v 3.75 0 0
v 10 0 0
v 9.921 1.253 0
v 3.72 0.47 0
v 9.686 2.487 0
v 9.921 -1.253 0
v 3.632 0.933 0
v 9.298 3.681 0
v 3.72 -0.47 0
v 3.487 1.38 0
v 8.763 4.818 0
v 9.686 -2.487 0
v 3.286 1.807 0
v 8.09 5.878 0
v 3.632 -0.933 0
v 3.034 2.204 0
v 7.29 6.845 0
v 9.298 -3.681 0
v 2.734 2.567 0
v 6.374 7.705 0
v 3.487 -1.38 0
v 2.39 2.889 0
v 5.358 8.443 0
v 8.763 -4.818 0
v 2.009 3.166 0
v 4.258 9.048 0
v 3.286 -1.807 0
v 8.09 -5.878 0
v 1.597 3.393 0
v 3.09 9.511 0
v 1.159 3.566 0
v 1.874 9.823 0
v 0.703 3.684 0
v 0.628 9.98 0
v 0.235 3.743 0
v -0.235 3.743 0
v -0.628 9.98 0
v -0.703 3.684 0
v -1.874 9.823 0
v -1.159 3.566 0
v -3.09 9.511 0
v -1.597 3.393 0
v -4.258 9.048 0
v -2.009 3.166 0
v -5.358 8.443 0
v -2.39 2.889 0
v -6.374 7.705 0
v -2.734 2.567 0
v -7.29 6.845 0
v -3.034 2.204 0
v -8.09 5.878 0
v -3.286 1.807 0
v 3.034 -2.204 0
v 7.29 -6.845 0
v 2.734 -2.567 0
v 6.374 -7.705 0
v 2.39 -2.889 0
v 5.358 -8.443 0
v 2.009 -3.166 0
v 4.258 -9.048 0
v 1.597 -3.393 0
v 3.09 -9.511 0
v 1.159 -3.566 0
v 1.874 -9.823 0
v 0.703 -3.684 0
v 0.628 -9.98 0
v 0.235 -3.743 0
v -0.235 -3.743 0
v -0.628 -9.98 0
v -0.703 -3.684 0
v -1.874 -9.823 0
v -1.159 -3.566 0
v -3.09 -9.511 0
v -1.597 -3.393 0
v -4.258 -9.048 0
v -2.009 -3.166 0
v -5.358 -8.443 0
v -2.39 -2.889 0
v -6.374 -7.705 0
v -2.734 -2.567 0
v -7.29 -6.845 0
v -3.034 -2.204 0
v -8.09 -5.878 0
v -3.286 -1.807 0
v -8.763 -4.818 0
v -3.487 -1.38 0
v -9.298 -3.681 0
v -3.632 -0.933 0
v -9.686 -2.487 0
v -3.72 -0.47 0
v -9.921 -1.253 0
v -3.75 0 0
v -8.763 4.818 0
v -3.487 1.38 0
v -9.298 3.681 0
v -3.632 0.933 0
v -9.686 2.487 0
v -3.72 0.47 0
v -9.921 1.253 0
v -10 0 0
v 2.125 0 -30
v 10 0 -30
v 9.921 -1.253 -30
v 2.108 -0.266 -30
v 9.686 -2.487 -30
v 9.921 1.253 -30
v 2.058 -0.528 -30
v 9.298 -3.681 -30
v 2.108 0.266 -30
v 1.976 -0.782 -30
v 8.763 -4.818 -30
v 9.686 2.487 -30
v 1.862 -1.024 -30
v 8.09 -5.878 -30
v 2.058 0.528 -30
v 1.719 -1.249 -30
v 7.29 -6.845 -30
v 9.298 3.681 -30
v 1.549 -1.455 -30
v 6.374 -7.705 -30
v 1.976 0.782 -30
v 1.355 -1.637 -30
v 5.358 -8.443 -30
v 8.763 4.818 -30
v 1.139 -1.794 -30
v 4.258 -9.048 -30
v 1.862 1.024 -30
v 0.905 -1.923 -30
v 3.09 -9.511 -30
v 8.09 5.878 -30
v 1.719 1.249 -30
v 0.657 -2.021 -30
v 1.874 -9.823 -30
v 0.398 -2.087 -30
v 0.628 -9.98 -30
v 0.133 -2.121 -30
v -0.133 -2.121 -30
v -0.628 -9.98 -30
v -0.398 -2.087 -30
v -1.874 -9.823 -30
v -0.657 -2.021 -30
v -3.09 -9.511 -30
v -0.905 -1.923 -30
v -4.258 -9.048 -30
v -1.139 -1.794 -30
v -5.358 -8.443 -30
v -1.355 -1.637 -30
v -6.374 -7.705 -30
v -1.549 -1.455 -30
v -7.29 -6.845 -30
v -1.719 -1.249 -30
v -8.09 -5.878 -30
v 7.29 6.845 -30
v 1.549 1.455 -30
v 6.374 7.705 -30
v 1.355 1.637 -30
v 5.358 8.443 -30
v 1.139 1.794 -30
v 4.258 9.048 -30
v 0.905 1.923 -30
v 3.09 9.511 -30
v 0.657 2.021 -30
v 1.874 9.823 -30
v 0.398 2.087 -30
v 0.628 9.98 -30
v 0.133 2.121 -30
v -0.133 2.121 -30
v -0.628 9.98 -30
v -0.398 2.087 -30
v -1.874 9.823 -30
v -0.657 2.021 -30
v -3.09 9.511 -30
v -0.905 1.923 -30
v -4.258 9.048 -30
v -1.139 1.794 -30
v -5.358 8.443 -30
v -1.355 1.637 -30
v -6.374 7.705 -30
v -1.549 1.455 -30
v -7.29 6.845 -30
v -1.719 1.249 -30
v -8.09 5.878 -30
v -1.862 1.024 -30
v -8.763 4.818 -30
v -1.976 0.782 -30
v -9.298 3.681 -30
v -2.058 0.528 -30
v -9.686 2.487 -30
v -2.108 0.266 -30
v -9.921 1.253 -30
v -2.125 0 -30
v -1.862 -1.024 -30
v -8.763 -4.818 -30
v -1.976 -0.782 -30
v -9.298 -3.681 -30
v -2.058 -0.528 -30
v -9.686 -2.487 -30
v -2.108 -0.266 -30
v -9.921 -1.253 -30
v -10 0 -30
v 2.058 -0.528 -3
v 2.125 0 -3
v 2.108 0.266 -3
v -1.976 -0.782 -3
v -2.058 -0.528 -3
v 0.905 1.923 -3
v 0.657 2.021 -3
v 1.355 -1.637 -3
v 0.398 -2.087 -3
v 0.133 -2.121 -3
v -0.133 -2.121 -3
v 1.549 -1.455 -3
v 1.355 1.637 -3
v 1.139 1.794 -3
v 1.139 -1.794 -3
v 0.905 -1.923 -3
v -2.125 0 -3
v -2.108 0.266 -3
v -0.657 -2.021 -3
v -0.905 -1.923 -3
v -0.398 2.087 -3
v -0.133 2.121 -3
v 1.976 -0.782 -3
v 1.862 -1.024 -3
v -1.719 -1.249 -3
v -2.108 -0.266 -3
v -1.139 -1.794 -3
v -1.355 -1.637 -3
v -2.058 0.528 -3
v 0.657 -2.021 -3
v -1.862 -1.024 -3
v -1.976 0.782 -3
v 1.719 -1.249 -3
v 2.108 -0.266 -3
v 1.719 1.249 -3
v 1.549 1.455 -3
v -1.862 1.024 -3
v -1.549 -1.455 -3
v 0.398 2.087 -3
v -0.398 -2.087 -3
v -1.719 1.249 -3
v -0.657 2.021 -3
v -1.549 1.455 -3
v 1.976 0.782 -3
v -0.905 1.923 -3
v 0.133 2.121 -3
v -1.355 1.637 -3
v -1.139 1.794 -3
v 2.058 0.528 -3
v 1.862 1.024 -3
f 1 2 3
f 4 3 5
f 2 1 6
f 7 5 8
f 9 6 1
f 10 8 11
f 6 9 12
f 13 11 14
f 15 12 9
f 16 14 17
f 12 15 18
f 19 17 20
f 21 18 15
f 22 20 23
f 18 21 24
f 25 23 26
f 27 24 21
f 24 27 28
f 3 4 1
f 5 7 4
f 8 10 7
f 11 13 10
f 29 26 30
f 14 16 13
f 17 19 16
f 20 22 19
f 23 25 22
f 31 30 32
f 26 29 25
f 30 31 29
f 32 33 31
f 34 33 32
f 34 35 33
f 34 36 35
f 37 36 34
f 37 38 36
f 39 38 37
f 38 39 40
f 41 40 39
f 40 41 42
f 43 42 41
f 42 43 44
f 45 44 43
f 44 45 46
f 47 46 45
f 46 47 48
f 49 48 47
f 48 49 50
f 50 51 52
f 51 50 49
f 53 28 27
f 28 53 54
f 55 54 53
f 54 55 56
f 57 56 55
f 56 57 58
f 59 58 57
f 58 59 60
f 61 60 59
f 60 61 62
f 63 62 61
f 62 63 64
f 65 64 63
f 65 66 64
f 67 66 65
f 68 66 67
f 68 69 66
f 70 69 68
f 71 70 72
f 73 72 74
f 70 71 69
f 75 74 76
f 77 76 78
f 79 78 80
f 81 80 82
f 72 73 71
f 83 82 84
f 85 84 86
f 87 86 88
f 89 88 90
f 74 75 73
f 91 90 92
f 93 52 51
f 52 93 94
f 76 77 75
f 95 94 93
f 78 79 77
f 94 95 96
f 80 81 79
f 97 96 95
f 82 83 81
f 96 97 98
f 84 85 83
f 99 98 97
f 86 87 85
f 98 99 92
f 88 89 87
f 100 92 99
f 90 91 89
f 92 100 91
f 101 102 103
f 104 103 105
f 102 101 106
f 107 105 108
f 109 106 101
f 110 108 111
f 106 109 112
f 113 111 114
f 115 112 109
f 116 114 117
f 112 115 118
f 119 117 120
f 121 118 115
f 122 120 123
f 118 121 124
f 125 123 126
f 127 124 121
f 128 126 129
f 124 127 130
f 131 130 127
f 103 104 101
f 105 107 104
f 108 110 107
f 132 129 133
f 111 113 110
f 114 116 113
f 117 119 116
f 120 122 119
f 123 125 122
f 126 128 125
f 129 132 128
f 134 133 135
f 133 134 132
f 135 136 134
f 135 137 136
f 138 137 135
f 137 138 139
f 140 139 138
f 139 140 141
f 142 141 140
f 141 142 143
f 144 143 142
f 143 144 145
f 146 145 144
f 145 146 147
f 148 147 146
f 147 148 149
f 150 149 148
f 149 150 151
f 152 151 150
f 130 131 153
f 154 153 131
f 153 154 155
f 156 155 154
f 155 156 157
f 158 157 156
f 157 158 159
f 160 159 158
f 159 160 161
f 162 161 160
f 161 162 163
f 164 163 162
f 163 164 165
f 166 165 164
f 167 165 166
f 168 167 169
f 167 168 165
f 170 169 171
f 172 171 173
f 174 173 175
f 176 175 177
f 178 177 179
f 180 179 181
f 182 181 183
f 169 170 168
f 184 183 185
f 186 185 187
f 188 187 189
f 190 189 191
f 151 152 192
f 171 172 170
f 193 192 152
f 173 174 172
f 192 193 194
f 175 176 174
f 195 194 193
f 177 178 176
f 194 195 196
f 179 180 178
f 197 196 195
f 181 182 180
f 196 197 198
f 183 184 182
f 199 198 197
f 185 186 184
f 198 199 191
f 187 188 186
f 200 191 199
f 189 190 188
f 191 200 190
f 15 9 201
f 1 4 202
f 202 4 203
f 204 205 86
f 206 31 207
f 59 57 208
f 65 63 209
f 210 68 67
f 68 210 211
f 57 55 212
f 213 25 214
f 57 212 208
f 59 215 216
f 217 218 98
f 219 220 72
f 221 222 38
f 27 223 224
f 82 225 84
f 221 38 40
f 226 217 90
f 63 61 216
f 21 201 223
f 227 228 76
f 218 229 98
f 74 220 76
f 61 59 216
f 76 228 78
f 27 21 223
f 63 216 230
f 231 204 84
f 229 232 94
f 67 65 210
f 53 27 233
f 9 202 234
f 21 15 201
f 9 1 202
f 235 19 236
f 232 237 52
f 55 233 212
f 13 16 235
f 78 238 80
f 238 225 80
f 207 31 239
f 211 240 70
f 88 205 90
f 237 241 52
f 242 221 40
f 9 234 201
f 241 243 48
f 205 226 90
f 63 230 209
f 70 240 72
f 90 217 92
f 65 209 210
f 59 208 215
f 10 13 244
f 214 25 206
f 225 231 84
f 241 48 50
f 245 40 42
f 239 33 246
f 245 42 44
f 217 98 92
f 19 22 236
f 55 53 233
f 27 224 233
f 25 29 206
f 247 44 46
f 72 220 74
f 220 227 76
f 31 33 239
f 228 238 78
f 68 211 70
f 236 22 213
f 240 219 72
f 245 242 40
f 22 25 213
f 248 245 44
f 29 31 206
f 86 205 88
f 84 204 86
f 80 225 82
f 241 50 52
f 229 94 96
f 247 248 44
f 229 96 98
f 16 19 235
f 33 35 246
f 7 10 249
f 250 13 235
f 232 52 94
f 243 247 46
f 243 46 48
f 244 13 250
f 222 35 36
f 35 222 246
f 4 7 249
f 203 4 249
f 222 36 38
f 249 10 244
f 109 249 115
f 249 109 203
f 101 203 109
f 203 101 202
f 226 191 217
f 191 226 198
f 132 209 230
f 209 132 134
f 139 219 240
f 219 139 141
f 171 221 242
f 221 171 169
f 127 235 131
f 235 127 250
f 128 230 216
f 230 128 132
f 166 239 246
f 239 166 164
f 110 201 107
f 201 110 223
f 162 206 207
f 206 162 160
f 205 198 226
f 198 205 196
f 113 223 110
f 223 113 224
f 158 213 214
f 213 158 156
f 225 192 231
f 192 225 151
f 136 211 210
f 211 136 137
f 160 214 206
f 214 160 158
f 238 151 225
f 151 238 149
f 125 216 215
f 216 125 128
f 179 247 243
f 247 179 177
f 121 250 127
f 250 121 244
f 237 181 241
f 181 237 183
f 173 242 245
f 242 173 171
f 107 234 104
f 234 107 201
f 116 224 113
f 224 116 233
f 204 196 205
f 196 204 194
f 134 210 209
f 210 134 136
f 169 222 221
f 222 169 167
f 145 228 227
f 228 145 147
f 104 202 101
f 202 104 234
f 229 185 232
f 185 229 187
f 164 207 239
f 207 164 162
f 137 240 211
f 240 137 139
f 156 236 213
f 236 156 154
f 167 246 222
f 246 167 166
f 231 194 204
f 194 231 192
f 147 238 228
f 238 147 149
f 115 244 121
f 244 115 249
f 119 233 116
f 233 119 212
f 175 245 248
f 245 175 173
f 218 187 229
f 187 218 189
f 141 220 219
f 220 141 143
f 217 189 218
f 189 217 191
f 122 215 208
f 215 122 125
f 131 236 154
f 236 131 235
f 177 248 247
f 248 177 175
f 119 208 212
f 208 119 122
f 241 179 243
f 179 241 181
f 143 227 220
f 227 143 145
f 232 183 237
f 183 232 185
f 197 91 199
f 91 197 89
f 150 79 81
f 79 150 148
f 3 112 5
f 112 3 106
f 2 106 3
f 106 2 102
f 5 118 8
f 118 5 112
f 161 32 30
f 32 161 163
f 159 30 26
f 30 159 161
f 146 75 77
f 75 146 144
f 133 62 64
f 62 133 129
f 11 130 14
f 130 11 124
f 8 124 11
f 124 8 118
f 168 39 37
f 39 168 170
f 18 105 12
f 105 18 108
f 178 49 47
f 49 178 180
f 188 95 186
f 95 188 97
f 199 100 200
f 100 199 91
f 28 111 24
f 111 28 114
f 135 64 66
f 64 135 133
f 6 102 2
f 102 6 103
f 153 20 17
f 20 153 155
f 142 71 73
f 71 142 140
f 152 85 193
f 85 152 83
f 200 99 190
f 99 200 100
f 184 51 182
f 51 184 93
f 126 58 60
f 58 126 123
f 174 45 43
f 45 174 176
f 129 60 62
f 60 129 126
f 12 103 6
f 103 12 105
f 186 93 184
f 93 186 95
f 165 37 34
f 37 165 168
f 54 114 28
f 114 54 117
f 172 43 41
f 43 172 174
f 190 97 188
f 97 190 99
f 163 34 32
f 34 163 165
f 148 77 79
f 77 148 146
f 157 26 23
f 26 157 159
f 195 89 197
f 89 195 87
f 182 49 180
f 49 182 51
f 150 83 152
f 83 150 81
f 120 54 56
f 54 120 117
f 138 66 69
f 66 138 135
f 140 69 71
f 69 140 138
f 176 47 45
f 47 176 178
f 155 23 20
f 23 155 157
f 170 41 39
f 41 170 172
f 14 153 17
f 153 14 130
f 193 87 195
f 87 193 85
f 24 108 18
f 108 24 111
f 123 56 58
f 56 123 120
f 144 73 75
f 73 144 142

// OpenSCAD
$fn = 50;


difference() {
	union() {
		translate(v = [0, 0, -30.0000000000]) {
			cylinder(h = 30, r = 10.0000000000);
		}
		cylinder(h = 0, r = 13.0000000000);
	}
	union() {
		translate(v = [0, 0, 0]) {
			rotate(a = [0, 0, 0]) {
				difference() {
					union() {
						#translate(v = [0, 0, -30.0000000000]) {
							cylinder(h = 30, r = 2.0000000000);
						}
						#translate(v = [0, 0, -3]) {
							cylinder(h = 3, r = 10.0000000000, r1 = 2.1250000000, r2 = 3.7500000000);
						}
						#translate(v = [0, 0, -30.0000000000]) {
							cylinder(h = 30, r = 2.1250000000);
						}
						#translate(v = [0, 0, -30.0000000000]) {
							cylinder(h = 30, r = 2.0000000000);
						}
					}
					union();
				}
			}
		}
	}
}
